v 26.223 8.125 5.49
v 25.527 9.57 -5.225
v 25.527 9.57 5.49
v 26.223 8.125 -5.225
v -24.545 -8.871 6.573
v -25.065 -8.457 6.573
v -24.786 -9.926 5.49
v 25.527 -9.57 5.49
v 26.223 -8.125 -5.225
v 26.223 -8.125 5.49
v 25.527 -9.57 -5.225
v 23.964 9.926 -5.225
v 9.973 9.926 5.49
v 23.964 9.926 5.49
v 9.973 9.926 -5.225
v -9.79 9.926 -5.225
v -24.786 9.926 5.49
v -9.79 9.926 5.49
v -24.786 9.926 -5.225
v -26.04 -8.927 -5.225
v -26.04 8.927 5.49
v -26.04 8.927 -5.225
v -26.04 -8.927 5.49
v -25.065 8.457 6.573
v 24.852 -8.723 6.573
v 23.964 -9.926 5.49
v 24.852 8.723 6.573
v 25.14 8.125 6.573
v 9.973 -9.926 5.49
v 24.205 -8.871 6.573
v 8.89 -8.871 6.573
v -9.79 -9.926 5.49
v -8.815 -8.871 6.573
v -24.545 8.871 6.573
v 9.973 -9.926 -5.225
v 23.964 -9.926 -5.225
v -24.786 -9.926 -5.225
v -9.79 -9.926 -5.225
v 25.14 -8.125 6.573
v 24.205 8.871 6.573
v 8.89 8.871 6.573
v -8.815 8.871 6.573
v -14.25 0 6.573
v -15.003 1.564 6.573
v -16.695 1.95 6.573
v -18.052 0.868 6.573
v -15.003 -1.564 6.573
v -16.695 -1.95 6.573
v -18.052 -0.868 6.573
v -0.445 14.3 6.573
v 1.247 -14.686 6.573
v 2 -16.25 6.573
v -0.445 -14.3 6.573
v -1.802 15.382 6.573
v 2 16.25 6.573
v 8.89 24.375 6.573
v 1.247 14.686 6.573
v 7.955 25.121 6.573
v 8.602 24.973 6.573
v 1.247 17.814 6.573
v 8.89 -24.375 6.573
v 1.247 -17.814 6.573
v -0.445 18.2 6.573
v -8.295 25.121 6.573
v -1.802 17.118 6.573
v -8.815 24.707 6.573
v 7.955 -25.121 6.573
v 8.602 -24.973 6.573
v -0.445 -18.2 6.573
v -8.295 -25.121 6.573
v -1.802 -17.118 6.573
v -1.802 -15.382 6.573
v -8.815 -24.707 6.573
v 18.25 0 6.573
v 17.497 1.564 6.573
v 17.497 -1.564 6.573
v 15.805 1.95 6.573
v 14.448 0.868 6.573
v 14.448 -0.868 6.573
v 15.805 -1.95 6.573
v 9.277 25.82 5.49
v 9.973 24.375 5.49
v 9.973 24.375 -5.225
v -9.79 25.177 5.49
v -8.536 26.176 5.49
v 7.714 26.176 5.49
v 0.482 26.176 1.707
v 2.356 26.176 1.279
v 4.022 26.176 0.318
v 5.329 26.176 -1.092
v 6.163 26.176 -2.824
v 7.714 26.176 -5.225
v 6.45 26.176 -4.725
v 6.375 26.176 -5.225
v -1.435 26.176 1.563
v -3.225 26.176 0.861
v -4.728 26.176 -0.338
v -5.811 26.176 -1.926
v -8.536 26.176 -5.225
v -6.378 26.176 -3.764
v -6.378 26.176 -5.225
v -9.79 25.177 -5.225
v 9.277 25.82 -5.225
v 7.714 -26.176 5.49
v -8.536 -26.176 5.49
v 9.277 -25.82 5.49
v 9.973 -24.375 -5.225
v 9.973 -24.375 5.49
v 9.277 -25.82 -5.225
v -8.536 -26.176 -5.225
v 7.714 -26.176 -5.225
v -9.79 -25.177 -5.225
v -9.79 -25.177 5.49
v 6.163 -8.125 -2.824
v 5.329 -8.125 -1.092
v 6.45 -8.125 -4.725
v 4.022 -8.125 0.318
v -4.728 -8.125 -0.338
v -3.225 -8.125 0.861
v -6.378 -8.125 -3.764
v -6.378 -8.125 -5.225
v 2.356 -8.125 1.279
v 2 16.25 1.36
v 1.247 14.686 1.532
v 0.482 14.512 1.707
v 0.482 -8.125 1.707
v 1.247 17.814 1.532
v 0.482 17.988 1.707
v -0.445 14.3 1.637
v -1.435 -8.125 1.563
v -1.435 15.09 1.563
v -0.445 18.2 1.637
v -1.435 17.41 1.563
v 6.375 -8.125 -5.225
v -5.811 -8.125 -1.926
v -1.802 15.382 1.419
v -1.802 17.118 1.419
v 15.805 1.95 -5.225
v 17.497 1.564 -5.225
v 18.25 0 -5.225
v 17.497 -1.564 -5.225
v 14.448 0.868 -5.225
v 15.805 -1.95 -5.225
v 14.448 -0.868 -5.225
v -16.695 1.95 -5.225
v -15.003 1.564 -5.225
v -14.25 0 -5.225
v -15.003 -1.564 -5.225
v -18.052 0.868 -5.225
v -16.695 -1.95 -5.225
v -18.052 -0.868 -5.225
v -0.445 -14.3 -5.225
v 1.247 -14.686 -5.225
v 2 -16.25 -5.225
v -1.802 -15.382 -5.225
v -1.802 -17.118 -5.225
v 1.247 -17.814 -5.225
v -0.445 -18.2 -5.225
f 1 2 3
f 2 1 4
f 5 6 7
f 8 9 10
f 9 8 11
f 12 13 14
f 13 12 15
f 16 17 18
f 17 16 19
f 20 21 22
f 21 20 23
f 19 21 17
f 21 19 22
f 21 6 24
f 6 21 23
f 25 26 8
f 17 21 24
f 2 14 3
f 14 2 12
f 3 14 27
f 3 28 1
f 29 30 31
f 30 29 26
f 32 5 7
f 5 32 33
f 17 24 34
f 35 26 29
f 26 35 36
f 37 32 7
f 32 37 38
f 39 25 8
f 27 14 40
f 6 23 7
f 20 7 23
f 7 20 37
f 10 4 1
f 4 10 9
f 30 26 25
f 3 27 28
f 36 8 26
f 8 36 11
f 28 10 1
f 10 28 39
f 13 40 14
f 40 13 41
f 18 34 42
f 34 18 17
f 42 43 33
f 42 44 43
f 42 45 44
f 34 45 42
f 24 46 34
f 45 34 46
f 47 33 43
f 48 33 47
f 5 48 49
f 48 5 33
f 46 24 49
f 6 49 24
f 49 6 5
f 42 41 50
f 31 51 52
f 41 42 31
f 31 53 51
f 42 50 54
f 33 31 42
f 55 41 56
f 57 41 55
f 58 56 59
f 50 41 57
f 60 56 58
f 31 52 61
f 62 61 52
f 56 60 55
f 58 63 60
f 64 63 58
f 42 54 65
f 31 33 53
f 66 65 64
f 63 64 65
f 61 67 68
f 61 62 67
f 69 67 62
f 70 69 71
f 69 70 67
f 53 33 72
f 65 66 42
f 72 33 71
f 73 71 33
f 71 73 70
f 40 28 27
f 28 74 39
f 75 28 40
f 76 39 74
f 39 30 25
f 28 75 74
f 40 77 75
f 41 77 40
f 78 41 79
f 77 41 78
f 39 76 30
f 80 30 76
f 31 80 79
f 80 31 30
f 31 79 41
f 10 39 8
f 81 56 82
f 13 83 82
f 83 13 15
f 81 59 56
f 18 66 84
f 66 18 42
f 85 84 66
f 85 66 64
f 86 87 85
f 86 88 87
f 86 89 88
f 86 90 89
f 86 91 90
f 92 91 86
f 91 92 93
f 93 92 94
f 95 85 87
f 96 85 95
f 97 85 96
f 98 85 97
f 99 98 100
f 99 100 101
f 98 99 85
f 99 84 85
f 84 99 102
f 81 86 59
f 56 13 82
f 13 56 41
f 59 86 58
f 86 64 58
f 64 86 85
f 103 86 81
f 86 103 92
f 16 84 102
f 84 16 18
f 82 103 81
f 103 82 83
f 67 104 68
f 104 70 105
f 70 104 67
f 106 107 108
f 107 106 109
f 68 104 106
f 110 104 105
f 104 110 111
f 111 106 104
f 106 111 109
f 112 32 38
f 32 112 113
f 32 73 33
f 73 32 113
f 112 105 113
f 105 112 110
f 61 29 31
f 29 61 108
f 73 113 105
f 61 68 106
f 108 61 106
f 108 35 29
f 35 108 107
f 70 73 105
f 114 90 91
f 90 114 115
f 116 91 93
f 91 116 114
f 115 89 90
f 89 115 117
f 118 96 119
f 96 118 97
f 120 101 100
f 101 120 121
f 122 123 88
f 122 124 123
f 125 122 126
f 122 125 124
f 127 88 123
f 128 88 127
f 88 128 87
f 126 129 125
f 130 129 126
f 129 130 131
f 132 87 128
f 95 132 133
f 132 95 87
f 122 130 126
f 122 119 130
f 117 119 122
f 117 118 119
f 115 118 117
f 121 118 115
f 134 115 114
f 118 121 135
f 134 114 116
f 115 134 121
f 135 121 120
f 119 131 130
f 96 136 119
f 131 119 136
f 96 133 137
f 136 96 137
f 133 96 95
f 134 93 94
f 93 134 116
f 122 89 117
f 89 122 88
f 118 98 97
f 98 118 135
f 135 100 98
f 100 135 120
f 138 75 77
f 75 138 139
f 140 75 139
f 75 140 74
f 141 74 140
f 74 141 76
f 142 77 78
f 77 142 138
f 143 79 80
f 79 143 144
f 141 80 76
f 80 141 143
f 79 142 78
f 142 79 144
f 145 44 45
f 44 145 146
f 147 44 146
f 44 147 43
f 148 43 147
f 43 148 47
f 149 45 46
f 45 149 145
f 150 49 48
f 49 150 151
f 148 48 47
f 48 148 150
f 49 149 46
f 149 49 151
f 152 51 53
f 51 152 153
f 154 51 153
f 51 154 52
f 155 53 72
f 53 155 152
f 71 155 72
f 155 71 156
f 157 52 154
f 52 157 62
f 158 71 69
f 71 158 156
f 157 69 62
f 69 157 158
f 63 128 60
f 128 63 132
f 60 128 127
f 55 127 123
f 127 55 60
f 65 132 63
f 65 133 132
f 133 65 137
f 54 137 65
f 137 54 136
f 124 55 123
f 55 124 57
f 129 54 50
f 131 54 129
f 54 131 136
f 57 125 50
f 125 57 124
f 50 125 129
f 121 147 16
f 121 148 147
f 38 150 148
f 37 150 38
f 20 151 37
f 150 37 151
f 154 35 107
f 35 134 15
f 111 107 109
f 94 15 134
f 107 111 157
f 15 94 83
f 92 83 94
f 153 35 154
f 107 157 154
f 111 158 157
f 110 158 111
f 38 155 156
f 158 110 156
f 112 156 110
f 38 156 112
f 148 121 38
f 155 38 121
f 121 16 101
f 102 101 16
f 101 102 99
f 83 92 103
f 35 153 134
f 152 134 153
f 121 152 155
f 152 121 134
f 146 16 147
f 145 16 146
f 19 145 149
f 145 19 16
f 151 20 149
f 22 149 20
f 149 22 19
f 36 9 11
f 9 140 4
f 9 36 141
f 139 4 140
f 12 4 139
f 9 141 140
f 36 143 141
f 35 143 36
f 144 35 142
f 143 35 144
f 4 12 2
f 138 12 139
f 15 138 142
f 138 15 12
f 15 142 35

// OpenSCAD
// file: model_dims.scad
// motormounts
m_h = c_d/2 + 3; 	// height of motor mount
x_1 = 16.25;		// distance from centre of motor mount to centre of screwholes
m_w = x_1; 			// width of motor mount

// body
ah_l = 55 ;//arm_holder_length
ch_full_l = 90; // full width of chassis
ch_full_h = 4.05; // height of chassis layer
// file: hardware_dims.scad
c_d = 12.9; 		// diameter of carbon fiber
s_d = 4; 			// diameter of silver screw holes

// units of PDB
pdb_bw = 50; // board_width
pdb_ch_d = 12.7; //centre_hole_dia = 12.8
sh_d = 3.2; //small_hole_dia = 3
dh_sd = 7.9; //small_hole_dist_from_side = 7.9
lh_sd = 19; //large_hole_dist_from_side = 19
p_w = 7.7; //pin_width = 7.7
d_diag = 13.9; //deans_diag = 13.9
p_sd = 8.4; //pin_dist_from_side = 8.4
d_sd = 20.8; //deans_dist_from_side = 20.8
sh_dc = 16.2; // small hole (orthogonal) distance from center
// main file
// tiny motormounts

include <hardware_dims.scad>
include <model_dims.scad>

difference() {
    minkowski (){
        union() {
                cube(size=[3*m_w,1*m_w,m_h], center=true);
                cube(size=[1*m_w,3*m_w,m_h], center=true);
        }
        sphere(r=2);

    }
	union() {
		translate([0,1.5*m_w,-m_h/2]) rotate([90,0,0]) cylinder(h=4*m_w, r=c_d/2, center=true);
		translate([x_1,0,0]) cylinder(h=2*m_h, r=s_d/2,center=true);
		translate([-x_1,0,0]) cylinder(h=2*m_h, r=s_d/2,center=true);
		translate([0,-x_1,0]) cylinder(h=2*m_h, r=s_d/2,center=true);
		translate([0,x_1,0]) cylinder(h=2*m_h, r=s_d/2,center=true);
	}
    translate([0,0,-(2+0.5*m_h)]) cube(size=[5+3*m_w,5+3*m_w,3], center=true);
}
